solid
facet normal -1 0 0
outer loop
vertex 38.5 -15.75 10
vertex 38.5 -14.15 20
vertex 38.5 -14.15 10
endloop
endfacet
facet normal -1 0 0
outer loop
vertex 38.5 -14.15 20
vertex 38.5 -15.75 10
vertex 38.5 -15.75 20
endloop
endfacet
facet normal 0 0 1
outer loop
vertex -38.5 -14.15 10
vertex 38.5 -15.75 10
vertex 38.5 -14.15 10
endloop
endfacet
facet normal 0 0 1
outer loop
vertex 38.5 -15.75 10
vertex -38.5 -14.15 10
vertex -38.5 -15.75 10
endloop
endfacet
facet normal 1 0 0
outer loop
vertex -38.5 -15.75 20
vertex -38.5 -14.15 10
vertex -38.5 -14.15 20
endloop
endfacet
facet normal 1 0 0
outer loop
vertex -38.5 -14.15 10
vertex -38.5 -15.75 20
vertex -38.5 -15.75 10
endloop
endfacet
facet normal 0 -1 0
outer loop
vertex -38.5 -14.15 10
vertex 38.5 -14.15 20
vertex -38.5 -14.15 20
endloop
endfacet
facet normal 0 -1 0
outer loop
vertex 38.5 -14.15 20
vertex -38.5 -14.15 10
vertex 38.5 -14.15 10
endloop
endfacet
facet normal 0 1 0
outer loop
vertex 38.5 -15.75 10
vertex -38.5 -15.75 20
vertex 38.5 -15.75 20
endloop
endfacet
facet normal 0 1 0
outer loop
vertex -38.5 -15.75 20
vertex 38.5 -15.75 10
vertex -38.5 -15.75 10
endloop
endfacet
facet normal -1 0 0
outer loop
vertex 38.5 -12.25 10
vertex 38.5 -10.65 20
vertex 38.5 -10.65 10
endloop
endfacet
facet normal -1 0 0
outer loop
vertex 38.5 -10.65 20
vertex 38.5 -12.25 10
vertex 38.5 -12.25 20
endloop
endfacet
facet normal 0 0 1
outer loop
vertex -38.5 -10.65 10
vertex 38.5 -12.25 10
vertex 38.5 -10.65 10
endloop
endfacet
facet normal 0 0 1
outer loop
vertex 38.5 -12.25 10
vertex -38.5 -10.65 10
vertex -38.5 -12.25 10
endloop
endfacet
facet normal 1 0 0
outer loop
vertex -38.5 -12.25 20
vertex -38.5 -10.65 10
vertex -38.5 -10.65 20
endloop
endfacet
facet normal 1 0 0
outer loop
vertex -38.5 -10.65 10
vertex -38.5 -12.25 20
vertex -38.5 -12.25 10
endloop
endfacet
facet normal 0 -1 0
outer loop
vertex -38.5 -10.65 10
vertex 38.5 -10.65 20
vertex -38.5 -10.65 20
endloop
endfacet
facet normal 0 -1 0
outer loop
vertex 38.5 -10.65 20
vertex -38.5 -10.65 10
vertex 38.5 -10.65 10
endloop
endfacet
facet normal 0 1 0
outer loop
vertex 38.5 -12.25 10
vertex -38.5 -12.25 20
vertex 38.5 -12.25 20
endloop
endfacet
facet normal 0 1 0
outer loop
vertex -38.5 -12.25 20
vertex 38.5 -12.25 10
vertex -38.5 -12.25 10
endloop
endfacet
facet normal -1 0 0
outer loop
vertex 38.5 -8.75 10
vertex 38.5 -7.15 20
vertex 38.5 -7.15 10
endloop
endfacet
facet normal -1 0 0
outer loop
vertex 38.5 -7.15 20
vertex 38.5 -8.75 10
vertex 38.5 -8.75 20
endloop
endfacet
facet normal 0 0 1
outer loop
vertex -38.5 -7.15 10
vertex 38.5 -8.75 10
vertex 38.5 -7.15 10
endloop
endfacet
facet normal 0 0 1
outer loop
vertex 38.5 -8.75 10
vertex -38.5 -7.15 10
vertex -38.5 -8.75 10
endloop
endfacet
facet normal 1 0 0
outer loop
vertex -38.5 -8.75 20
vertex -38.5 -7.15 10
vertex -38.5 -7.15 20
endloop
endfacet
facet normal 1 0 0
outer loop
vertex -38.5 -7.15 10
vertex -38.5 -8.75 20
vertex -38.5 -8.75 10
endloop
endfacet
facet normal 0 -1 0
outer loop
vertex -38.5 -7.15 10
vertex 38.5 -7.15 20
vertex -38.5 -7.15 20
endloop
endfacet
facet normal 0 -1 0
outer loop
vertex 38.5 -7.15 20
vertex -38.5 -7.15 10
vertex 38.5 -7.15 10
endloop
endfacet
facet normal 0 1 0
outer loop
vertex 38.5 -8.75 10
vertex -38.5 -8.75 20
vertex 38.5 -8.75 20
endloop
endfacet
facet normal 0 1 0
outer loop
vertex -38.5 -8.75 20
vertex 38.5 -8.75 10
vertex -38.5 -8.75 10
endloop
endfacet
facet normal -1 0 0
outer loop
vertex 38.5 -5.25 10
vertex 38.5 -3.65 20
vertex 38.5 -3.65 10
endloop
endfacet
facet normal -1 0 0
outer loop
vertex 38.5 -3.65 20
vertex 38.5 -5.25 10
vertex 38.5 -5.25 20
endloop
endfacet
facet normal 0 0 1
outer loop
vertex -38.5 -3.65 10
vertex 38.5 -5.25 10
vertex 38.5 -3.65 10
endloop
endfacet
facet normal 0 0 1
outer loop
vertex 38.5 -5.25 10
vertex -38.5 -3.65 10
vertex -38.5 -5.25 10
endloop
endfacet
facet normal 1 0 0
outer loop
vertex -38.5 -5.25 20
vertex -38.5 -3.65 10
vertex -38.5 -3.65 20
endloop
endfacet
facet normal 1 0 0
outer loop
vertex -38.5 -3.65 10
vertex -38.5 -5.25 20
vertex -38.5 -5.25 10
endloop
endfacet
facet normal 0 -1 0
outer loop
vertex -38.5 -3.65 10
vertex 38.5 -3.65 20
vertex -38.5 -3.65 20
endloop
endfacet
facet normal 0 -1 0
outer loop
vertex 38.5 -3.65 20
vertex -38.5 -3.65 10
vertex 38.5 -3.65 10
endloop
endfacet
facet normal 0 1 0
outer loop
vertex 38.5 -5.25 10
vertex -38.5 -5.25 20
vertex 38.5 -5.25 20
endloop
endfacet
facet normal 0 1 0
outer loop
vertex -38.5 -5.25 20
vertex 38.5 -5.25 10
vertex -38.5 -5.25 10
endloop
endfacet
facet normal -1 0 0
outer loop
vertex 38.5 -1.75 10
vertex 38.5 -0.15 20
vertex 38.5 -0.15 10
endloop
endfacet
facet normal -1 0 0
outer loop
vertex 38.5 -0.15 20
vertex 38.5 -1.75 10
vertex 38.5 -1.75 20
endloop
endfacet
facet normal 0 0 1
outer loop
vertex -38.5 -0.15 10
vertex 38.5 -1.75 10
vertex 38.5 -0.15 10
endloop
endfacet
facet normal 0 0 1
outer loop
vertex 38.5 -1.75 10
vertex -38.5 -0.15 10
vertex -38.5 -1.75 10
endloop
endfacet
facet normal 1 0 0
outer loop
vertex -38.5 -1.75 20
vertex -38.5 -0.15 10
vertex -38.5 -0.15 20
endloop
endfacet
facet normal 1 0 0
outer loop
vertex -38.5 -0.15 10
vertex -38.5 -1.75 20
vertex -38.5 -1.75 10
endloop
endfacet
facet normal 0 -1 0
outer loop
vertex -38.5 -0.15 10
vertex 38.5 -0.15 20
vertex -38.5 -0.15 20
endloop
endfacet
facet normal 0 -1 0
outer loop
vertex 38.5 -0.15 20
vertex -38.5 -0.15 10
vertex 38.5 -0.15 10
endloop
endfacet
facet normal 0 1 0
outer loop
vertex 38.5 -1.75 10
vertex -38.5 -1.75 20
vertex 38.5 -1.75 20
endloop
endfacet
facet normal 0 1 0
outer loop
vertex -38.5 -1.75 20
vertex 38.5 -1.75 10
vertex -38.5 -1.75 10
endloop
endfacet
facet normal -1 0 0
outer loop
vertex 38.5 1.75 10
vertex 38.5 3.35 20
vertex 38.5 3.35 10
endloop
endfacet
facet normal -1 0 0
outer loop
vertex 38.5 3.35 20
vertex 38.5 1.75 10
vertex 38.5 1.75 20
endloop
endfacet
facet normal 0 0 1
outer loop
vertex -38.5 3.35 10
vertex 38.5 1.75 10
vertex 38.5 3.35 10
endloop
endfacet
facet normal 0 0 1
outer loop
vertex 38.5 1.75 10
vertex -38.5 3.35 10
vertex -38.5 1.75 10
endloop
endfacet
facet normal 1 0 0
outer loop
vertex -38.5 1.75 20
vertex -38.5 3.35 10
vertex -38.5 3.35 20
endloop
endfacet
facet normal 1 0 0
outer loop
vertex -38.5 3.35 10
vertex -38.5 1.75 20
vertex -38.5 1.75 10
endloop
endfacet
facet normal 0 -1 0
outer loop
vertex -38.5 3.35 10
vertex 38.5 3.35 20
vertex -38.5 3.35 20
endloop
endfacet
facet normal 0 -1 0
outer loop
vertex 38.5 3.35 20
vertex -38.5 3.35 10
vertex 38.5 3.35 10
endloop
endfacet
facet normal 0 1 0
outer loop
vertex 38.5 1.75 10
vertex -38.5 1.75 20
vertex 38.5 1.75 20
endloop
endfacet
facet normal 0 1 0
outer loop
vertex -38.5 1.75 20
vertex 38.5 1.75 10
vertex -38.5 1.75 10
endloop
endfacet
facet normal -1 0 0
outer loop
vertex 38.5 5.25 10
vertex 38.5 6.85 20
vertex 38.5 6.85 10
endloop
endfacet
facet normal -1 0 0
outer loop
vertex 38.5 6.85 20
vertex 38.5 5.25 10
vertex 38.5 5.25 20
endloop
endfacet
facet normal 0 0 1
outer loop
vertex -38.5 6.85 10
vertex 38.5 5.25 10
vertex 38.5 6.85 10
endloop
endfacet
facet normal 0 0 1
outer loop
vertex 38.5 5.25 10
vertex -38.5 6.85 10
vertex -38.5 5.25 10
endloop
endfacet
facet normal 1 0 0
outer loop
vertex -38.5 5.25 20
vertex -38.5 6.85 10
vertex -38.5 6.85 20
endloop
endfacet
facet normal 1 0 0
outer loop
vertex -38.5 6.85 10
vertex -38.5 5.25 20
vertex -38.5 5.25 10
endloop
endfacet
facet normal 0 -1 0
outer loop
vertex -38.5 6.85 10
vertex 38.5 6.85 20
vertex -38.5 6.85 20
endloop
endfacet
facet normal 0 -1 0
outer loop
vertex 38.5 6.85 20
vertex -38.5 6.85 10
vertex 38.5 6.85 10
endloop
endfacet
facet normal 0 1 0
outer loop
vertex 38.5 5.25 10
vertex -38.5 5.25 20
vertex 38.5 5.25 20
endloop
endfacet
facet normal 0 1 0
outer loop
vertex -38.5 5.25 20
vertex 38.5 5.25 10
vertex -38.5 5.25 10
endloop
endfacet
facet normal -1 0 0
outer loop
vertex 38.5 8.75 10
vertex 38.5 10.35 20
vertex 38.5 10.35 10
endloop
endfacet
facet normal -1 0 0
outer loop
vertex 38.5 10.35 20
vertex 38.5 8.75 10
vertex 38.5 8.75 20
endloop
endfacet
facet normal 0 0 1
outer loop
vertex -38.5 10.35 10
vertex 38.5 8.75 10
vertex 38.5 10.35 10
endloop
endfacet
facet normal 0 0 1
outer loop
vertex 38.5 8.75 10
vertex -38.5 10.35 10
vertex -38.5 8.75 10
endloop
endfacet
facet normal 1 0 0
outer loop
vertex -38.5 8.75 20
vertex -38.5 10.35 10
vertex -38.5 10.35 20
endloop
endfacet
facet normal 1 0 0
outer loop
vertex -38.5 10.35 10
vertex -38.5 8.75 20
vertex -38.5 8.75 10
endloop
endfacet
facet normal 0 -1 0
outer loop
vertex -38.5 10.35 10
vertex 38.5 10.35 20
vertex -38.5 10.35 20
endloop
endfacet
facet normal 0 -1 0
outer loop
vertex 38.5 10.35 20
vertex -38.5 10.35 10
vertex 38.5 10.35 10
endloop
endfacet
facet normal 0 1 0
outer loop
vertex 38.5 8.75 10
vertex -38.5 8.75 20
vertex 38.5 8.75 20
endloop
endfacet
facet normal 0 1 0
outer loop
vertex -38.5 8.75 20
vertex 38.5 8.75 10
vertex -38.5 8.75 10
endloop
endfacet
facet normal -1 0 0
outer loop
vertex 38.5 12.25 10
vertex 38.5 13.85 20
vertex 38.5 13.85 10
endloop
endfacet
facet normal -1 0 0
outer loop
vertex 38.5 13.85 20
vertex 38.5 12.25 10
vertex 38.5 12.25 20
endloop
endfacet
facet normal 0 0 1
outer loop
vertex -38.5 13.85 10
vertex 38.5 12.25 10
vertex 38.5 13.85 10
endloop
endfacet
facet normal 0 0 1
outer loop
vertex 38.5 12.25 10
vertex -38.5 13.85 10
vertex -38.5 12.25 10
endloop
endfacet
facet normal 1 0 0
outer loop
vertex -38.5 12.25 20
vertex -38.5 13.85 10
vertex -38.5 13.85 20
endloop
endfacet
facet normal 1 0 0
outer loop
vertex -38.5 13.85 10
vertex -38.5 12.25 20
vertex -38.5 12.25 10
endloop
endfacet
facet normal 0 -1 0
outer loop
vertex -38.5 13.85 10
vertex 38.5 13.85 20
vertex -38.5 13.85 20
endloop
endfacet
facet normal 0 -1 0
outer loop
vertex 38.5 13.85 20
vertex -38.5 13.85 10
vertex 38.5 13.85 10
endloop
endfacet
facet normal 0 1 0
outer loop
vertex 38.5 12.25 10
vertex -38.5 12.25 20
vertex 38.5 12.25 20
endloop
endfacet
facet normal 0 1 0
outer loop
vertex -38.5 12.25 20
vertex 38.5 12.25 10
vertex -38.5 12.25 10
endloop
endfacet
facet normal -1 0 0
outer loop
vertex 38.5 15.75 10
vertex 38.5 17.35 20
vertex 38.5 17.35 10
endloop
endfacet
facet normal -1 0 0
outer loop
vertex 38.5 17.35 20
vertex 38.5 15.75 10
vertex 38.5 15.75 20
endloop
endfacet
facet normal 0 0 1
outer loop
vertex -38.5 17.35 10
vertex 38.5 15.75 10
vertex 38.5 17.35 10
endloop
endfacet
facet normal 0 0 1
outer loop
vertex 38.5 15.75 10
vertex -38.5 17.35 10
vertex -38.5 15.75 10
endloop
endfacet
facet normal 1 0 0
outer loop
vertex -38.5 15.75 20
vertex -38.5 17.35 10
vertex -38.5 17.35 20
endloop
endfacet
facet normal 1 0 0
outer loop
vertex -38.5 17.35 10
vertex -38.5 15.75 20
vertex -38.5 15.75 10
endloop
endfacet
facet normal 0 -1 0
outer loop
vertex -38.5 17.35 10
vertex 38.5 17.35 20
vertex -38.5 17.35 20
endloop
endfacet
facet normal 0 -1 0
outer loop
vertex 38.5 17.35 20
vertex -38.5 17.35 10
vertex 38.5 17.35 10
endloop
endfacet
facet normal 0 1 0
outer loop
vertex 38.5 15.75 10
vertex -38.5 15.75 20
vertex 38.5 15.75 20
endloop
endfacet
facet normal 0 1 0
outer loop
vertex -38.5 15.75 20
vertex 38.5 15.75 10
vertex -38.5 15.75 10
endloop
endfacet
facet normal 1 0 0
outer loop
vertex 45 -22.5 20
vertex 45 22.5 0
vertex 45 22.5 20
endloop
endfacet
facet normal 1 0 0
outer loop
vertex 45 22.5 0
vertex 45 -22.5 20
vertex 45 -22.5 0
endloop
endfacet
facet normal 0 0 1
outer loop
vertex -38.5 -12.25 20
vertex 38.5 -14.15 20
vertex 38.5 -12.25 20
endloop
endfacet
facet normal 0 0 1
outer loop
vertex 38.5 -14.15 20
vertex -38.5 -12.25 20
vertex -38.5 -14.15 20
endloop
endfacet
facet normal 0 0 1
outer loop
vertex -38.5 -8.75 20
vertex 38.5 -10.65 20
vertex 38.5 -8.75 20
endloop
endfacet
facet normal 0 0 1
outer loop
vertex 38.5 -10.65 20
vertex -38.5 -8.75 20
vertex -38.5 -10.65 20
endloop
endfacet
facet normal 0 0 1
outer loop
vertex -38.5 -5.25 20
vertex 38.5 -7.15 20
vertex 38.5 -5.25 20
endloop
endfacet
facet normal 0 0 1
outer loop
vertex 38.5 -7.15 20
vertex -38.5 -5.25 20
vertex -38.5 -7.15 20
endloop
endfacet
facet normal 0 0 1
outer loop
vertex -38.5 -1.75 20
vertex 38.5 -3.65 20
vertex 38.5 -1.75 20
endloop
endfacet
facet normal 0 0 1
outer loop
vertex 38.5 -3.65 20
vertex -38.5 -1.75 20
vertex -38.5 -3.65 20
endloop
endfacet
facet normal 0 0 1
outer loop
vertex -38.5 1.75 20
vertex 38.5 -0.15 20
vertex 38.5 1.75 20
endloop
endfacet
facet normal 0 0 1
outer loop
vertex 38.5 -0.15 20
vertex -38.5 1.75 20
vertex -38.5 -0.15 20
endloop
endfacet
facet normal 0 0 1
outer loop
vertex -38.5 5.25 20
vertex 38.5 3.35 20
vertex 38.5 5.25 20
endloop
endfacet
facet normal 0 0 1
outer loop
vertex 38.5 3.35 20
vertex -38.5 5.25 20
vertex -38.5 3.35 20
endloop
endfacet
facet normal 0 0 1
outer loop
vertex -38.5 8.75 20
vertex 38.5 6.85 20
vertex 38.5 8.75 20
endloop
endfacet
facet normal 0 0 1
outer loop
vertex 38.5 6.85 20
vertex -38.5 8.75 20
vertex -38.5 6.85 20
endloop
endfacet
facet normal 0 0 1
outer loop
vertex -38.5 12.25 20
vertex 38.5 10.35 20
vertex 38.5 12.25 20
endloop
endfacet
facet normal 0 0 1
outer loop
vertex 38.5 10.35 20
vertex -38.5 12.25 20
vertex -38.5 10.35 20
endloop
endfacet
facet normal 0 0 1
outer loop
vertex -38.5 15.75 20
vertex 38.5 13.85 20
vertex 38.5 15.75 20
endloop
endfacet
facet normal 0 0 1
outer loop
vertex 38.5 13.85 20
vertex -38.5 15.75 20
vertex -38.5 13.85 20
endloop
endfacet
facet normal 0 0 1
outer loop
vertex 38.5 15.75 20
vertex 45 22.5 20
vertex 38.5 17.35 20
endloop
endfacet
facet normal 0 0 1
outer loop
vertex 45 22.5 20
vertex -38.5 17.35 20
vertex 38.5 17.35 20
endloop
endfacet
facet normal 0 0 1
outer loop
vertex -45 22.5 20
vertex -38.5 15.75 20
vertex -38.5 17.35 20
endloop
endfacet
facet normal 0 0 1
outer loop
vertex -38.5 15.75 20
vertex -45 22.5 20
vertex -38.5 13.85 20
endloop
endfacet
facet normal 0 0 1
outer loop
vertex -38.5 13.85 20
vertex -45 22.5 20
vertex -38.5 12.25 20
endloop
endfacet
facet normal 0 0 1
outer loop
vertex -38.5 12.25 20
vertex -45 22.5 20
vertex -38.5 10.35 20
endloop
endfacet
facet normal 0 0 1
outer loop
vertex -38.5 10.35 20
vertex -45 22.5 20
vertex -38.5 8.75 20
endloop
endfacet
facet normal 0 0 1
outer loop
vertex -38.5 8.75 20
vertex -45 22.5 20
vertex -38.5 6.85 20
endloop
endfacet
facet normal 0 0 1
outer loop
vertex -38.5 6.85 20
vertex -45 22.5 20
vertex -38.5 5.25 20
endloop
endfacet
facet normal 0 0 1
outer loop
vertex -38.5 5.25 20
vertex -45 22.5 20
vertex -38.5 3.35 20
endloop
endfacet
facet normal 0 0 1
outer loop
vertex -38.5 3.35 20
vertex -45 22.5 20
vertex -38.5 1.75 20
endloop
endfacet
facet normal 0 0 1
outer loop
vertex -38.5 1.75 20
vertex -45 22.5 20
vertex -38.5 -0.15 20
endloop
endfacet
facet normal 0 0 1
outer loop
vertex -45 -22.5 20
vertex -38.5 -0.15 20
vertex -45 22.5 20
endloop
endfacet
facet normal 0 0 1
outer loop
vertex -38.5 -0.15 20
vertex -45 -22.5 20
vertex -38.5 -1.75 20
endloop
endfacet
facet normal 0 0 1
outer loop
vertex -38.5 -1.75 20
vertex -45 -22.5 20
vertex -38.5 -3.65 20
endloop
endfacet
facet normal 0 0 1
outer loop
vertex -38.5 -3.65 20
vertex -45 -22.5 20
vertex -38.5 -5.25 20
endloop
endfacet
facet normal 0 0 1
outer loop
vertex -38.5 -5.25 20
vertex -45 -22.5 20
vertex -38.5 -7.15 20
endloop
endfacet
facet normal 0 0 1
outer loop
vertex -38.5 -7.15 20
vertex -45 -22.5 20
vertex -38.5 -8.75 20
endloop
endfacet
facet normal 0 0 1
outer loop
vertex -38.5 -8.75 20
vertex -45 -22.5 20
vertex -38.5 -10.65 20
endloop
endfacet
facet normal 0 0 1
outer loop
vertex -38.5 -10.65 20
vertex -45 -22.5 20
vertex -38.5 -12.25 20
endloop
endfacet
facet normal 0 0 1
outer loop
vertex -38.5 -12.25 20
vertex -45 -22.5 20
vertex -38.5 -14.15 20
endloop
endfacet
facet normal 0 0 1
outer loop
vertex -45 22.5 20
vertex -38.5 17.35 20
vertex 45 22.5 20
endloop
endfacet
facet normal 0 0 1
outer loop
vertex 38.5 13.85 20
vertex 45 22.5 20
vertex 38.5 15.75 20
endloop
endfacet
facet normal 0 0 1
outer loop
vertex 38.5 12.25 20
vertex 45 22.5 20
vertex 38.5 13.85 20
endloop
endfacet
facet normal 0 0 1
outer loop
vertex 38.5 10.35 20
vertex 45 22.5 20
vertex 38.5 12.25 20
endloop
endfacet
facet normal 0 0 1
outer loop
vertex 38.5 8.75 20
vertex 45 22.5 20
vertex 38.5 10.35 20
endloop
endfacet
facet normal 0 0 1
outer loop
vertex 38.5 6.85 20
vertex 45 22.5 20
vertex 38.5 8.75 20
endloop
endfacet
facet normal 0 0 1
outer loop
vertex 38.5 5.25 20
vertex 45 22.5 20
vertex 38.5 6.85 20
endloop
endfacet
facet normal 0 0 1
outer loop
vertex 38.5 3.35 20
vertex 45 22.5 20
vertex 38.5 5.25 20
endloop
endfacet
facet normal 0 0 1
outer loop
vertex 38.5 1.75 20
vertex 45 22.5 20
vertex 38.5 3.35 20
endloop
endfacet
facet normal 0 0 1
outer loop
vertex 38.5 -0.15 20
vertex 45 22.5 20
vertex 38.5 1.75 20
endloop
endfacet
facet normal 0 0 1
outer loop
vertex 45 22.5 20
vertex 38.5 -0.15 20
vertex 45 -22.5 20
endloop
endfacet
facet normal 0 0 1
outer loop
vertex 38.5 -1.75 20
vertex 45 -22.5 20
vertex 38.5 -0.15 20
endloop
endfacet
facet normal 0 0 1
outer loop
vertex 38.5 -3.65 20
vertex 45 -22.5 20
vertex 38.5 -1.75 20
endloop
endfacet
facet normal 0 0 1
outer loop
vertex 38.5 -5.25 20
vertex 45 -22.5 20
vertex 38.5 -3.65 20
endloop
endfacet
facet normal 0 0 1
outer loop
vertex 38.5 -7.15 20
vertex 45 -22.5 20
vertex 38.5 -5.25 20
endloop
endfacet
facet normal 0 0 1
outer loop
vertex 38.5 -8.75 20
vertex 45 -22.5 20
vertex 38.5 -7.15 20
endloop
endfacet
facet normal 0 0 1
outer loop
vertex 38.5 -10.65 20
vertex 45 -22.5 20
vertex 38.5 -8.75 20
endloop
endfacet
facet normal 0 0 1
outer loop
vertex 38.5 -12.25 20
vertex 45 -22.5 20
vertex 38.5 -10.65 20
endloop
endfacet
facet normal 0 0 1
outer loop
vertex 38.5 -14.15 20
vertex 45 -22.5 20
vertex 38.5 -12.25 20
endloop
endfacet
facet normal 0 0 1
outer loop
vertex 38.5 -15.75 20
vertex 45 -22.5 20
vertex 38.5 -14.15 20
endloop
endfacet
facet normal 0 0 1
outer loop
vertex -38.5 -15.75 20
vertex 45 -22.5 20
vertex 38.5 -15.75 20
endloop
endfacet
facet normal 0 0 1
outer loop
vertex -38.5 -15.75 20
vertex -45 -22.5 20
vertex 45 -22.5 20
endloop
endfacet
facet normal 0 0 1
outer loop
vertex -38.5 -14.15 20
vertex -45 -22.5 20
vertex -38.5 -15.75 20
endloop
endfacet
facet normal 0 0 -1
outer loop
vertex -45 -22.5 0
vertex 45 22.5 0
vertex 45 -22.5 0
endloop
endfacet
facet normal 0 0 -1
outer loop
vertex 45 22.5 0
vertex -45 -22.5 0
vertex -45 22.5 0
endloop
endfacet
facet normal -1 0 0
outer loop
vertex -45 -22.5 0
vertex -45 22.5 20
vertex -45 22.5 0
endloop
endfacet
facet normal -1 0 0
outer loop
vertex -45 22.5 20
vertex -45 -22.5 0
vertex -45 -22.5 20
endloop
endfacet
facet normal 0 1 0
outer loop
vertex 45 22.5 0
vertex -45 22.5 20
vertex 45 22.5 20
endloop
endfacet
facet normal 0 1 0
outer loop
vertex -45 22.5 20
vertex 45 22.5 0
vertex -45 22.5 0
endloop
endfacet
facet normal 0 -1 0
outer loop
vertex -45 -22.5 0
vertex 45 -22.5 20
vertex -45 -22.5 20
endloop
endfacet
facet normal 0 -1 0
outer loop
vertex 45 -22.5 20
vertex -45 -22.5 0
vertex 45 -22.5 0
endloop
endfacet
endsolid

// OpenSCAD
// Microscope slide drying rack
// Units: mm

// ---- Block ----
block_l = 90;      // block length (X)
block_w = 45;      // block width (Y)
block_h = 20;      // block height (Z)

// ---- Slots ----
slot_n     = 10;   // number of slots
slot_len   = 77;   // slot length along X
slot_w     = 1.6;  // slot width along Y
slot_d     = 10;   // slot depth from top face
slot_pitch = 3.5;  // centre-to-centre spacing along Y

// ---- Cut clearance ----
eps = 0.5;         // extension past cut faces

$fn = 64;

difference() {
    // Base block, centred in X/Y, resting on z = 0
    translate([-block_l/2, -block_w/2, 0])
        cube([block_l, block_w, block_h]);

    // Row of parallel slots, centred on the block
    for (i = [0 : slot_n - 1]) {
        y = (i - (slot_n - 1)/2) * slot_pitch;
        translate([-slot_len/2, y, block_h - slot_d])
            cube([slot_len, slot_w, slot_d + eps]);
    }
}
